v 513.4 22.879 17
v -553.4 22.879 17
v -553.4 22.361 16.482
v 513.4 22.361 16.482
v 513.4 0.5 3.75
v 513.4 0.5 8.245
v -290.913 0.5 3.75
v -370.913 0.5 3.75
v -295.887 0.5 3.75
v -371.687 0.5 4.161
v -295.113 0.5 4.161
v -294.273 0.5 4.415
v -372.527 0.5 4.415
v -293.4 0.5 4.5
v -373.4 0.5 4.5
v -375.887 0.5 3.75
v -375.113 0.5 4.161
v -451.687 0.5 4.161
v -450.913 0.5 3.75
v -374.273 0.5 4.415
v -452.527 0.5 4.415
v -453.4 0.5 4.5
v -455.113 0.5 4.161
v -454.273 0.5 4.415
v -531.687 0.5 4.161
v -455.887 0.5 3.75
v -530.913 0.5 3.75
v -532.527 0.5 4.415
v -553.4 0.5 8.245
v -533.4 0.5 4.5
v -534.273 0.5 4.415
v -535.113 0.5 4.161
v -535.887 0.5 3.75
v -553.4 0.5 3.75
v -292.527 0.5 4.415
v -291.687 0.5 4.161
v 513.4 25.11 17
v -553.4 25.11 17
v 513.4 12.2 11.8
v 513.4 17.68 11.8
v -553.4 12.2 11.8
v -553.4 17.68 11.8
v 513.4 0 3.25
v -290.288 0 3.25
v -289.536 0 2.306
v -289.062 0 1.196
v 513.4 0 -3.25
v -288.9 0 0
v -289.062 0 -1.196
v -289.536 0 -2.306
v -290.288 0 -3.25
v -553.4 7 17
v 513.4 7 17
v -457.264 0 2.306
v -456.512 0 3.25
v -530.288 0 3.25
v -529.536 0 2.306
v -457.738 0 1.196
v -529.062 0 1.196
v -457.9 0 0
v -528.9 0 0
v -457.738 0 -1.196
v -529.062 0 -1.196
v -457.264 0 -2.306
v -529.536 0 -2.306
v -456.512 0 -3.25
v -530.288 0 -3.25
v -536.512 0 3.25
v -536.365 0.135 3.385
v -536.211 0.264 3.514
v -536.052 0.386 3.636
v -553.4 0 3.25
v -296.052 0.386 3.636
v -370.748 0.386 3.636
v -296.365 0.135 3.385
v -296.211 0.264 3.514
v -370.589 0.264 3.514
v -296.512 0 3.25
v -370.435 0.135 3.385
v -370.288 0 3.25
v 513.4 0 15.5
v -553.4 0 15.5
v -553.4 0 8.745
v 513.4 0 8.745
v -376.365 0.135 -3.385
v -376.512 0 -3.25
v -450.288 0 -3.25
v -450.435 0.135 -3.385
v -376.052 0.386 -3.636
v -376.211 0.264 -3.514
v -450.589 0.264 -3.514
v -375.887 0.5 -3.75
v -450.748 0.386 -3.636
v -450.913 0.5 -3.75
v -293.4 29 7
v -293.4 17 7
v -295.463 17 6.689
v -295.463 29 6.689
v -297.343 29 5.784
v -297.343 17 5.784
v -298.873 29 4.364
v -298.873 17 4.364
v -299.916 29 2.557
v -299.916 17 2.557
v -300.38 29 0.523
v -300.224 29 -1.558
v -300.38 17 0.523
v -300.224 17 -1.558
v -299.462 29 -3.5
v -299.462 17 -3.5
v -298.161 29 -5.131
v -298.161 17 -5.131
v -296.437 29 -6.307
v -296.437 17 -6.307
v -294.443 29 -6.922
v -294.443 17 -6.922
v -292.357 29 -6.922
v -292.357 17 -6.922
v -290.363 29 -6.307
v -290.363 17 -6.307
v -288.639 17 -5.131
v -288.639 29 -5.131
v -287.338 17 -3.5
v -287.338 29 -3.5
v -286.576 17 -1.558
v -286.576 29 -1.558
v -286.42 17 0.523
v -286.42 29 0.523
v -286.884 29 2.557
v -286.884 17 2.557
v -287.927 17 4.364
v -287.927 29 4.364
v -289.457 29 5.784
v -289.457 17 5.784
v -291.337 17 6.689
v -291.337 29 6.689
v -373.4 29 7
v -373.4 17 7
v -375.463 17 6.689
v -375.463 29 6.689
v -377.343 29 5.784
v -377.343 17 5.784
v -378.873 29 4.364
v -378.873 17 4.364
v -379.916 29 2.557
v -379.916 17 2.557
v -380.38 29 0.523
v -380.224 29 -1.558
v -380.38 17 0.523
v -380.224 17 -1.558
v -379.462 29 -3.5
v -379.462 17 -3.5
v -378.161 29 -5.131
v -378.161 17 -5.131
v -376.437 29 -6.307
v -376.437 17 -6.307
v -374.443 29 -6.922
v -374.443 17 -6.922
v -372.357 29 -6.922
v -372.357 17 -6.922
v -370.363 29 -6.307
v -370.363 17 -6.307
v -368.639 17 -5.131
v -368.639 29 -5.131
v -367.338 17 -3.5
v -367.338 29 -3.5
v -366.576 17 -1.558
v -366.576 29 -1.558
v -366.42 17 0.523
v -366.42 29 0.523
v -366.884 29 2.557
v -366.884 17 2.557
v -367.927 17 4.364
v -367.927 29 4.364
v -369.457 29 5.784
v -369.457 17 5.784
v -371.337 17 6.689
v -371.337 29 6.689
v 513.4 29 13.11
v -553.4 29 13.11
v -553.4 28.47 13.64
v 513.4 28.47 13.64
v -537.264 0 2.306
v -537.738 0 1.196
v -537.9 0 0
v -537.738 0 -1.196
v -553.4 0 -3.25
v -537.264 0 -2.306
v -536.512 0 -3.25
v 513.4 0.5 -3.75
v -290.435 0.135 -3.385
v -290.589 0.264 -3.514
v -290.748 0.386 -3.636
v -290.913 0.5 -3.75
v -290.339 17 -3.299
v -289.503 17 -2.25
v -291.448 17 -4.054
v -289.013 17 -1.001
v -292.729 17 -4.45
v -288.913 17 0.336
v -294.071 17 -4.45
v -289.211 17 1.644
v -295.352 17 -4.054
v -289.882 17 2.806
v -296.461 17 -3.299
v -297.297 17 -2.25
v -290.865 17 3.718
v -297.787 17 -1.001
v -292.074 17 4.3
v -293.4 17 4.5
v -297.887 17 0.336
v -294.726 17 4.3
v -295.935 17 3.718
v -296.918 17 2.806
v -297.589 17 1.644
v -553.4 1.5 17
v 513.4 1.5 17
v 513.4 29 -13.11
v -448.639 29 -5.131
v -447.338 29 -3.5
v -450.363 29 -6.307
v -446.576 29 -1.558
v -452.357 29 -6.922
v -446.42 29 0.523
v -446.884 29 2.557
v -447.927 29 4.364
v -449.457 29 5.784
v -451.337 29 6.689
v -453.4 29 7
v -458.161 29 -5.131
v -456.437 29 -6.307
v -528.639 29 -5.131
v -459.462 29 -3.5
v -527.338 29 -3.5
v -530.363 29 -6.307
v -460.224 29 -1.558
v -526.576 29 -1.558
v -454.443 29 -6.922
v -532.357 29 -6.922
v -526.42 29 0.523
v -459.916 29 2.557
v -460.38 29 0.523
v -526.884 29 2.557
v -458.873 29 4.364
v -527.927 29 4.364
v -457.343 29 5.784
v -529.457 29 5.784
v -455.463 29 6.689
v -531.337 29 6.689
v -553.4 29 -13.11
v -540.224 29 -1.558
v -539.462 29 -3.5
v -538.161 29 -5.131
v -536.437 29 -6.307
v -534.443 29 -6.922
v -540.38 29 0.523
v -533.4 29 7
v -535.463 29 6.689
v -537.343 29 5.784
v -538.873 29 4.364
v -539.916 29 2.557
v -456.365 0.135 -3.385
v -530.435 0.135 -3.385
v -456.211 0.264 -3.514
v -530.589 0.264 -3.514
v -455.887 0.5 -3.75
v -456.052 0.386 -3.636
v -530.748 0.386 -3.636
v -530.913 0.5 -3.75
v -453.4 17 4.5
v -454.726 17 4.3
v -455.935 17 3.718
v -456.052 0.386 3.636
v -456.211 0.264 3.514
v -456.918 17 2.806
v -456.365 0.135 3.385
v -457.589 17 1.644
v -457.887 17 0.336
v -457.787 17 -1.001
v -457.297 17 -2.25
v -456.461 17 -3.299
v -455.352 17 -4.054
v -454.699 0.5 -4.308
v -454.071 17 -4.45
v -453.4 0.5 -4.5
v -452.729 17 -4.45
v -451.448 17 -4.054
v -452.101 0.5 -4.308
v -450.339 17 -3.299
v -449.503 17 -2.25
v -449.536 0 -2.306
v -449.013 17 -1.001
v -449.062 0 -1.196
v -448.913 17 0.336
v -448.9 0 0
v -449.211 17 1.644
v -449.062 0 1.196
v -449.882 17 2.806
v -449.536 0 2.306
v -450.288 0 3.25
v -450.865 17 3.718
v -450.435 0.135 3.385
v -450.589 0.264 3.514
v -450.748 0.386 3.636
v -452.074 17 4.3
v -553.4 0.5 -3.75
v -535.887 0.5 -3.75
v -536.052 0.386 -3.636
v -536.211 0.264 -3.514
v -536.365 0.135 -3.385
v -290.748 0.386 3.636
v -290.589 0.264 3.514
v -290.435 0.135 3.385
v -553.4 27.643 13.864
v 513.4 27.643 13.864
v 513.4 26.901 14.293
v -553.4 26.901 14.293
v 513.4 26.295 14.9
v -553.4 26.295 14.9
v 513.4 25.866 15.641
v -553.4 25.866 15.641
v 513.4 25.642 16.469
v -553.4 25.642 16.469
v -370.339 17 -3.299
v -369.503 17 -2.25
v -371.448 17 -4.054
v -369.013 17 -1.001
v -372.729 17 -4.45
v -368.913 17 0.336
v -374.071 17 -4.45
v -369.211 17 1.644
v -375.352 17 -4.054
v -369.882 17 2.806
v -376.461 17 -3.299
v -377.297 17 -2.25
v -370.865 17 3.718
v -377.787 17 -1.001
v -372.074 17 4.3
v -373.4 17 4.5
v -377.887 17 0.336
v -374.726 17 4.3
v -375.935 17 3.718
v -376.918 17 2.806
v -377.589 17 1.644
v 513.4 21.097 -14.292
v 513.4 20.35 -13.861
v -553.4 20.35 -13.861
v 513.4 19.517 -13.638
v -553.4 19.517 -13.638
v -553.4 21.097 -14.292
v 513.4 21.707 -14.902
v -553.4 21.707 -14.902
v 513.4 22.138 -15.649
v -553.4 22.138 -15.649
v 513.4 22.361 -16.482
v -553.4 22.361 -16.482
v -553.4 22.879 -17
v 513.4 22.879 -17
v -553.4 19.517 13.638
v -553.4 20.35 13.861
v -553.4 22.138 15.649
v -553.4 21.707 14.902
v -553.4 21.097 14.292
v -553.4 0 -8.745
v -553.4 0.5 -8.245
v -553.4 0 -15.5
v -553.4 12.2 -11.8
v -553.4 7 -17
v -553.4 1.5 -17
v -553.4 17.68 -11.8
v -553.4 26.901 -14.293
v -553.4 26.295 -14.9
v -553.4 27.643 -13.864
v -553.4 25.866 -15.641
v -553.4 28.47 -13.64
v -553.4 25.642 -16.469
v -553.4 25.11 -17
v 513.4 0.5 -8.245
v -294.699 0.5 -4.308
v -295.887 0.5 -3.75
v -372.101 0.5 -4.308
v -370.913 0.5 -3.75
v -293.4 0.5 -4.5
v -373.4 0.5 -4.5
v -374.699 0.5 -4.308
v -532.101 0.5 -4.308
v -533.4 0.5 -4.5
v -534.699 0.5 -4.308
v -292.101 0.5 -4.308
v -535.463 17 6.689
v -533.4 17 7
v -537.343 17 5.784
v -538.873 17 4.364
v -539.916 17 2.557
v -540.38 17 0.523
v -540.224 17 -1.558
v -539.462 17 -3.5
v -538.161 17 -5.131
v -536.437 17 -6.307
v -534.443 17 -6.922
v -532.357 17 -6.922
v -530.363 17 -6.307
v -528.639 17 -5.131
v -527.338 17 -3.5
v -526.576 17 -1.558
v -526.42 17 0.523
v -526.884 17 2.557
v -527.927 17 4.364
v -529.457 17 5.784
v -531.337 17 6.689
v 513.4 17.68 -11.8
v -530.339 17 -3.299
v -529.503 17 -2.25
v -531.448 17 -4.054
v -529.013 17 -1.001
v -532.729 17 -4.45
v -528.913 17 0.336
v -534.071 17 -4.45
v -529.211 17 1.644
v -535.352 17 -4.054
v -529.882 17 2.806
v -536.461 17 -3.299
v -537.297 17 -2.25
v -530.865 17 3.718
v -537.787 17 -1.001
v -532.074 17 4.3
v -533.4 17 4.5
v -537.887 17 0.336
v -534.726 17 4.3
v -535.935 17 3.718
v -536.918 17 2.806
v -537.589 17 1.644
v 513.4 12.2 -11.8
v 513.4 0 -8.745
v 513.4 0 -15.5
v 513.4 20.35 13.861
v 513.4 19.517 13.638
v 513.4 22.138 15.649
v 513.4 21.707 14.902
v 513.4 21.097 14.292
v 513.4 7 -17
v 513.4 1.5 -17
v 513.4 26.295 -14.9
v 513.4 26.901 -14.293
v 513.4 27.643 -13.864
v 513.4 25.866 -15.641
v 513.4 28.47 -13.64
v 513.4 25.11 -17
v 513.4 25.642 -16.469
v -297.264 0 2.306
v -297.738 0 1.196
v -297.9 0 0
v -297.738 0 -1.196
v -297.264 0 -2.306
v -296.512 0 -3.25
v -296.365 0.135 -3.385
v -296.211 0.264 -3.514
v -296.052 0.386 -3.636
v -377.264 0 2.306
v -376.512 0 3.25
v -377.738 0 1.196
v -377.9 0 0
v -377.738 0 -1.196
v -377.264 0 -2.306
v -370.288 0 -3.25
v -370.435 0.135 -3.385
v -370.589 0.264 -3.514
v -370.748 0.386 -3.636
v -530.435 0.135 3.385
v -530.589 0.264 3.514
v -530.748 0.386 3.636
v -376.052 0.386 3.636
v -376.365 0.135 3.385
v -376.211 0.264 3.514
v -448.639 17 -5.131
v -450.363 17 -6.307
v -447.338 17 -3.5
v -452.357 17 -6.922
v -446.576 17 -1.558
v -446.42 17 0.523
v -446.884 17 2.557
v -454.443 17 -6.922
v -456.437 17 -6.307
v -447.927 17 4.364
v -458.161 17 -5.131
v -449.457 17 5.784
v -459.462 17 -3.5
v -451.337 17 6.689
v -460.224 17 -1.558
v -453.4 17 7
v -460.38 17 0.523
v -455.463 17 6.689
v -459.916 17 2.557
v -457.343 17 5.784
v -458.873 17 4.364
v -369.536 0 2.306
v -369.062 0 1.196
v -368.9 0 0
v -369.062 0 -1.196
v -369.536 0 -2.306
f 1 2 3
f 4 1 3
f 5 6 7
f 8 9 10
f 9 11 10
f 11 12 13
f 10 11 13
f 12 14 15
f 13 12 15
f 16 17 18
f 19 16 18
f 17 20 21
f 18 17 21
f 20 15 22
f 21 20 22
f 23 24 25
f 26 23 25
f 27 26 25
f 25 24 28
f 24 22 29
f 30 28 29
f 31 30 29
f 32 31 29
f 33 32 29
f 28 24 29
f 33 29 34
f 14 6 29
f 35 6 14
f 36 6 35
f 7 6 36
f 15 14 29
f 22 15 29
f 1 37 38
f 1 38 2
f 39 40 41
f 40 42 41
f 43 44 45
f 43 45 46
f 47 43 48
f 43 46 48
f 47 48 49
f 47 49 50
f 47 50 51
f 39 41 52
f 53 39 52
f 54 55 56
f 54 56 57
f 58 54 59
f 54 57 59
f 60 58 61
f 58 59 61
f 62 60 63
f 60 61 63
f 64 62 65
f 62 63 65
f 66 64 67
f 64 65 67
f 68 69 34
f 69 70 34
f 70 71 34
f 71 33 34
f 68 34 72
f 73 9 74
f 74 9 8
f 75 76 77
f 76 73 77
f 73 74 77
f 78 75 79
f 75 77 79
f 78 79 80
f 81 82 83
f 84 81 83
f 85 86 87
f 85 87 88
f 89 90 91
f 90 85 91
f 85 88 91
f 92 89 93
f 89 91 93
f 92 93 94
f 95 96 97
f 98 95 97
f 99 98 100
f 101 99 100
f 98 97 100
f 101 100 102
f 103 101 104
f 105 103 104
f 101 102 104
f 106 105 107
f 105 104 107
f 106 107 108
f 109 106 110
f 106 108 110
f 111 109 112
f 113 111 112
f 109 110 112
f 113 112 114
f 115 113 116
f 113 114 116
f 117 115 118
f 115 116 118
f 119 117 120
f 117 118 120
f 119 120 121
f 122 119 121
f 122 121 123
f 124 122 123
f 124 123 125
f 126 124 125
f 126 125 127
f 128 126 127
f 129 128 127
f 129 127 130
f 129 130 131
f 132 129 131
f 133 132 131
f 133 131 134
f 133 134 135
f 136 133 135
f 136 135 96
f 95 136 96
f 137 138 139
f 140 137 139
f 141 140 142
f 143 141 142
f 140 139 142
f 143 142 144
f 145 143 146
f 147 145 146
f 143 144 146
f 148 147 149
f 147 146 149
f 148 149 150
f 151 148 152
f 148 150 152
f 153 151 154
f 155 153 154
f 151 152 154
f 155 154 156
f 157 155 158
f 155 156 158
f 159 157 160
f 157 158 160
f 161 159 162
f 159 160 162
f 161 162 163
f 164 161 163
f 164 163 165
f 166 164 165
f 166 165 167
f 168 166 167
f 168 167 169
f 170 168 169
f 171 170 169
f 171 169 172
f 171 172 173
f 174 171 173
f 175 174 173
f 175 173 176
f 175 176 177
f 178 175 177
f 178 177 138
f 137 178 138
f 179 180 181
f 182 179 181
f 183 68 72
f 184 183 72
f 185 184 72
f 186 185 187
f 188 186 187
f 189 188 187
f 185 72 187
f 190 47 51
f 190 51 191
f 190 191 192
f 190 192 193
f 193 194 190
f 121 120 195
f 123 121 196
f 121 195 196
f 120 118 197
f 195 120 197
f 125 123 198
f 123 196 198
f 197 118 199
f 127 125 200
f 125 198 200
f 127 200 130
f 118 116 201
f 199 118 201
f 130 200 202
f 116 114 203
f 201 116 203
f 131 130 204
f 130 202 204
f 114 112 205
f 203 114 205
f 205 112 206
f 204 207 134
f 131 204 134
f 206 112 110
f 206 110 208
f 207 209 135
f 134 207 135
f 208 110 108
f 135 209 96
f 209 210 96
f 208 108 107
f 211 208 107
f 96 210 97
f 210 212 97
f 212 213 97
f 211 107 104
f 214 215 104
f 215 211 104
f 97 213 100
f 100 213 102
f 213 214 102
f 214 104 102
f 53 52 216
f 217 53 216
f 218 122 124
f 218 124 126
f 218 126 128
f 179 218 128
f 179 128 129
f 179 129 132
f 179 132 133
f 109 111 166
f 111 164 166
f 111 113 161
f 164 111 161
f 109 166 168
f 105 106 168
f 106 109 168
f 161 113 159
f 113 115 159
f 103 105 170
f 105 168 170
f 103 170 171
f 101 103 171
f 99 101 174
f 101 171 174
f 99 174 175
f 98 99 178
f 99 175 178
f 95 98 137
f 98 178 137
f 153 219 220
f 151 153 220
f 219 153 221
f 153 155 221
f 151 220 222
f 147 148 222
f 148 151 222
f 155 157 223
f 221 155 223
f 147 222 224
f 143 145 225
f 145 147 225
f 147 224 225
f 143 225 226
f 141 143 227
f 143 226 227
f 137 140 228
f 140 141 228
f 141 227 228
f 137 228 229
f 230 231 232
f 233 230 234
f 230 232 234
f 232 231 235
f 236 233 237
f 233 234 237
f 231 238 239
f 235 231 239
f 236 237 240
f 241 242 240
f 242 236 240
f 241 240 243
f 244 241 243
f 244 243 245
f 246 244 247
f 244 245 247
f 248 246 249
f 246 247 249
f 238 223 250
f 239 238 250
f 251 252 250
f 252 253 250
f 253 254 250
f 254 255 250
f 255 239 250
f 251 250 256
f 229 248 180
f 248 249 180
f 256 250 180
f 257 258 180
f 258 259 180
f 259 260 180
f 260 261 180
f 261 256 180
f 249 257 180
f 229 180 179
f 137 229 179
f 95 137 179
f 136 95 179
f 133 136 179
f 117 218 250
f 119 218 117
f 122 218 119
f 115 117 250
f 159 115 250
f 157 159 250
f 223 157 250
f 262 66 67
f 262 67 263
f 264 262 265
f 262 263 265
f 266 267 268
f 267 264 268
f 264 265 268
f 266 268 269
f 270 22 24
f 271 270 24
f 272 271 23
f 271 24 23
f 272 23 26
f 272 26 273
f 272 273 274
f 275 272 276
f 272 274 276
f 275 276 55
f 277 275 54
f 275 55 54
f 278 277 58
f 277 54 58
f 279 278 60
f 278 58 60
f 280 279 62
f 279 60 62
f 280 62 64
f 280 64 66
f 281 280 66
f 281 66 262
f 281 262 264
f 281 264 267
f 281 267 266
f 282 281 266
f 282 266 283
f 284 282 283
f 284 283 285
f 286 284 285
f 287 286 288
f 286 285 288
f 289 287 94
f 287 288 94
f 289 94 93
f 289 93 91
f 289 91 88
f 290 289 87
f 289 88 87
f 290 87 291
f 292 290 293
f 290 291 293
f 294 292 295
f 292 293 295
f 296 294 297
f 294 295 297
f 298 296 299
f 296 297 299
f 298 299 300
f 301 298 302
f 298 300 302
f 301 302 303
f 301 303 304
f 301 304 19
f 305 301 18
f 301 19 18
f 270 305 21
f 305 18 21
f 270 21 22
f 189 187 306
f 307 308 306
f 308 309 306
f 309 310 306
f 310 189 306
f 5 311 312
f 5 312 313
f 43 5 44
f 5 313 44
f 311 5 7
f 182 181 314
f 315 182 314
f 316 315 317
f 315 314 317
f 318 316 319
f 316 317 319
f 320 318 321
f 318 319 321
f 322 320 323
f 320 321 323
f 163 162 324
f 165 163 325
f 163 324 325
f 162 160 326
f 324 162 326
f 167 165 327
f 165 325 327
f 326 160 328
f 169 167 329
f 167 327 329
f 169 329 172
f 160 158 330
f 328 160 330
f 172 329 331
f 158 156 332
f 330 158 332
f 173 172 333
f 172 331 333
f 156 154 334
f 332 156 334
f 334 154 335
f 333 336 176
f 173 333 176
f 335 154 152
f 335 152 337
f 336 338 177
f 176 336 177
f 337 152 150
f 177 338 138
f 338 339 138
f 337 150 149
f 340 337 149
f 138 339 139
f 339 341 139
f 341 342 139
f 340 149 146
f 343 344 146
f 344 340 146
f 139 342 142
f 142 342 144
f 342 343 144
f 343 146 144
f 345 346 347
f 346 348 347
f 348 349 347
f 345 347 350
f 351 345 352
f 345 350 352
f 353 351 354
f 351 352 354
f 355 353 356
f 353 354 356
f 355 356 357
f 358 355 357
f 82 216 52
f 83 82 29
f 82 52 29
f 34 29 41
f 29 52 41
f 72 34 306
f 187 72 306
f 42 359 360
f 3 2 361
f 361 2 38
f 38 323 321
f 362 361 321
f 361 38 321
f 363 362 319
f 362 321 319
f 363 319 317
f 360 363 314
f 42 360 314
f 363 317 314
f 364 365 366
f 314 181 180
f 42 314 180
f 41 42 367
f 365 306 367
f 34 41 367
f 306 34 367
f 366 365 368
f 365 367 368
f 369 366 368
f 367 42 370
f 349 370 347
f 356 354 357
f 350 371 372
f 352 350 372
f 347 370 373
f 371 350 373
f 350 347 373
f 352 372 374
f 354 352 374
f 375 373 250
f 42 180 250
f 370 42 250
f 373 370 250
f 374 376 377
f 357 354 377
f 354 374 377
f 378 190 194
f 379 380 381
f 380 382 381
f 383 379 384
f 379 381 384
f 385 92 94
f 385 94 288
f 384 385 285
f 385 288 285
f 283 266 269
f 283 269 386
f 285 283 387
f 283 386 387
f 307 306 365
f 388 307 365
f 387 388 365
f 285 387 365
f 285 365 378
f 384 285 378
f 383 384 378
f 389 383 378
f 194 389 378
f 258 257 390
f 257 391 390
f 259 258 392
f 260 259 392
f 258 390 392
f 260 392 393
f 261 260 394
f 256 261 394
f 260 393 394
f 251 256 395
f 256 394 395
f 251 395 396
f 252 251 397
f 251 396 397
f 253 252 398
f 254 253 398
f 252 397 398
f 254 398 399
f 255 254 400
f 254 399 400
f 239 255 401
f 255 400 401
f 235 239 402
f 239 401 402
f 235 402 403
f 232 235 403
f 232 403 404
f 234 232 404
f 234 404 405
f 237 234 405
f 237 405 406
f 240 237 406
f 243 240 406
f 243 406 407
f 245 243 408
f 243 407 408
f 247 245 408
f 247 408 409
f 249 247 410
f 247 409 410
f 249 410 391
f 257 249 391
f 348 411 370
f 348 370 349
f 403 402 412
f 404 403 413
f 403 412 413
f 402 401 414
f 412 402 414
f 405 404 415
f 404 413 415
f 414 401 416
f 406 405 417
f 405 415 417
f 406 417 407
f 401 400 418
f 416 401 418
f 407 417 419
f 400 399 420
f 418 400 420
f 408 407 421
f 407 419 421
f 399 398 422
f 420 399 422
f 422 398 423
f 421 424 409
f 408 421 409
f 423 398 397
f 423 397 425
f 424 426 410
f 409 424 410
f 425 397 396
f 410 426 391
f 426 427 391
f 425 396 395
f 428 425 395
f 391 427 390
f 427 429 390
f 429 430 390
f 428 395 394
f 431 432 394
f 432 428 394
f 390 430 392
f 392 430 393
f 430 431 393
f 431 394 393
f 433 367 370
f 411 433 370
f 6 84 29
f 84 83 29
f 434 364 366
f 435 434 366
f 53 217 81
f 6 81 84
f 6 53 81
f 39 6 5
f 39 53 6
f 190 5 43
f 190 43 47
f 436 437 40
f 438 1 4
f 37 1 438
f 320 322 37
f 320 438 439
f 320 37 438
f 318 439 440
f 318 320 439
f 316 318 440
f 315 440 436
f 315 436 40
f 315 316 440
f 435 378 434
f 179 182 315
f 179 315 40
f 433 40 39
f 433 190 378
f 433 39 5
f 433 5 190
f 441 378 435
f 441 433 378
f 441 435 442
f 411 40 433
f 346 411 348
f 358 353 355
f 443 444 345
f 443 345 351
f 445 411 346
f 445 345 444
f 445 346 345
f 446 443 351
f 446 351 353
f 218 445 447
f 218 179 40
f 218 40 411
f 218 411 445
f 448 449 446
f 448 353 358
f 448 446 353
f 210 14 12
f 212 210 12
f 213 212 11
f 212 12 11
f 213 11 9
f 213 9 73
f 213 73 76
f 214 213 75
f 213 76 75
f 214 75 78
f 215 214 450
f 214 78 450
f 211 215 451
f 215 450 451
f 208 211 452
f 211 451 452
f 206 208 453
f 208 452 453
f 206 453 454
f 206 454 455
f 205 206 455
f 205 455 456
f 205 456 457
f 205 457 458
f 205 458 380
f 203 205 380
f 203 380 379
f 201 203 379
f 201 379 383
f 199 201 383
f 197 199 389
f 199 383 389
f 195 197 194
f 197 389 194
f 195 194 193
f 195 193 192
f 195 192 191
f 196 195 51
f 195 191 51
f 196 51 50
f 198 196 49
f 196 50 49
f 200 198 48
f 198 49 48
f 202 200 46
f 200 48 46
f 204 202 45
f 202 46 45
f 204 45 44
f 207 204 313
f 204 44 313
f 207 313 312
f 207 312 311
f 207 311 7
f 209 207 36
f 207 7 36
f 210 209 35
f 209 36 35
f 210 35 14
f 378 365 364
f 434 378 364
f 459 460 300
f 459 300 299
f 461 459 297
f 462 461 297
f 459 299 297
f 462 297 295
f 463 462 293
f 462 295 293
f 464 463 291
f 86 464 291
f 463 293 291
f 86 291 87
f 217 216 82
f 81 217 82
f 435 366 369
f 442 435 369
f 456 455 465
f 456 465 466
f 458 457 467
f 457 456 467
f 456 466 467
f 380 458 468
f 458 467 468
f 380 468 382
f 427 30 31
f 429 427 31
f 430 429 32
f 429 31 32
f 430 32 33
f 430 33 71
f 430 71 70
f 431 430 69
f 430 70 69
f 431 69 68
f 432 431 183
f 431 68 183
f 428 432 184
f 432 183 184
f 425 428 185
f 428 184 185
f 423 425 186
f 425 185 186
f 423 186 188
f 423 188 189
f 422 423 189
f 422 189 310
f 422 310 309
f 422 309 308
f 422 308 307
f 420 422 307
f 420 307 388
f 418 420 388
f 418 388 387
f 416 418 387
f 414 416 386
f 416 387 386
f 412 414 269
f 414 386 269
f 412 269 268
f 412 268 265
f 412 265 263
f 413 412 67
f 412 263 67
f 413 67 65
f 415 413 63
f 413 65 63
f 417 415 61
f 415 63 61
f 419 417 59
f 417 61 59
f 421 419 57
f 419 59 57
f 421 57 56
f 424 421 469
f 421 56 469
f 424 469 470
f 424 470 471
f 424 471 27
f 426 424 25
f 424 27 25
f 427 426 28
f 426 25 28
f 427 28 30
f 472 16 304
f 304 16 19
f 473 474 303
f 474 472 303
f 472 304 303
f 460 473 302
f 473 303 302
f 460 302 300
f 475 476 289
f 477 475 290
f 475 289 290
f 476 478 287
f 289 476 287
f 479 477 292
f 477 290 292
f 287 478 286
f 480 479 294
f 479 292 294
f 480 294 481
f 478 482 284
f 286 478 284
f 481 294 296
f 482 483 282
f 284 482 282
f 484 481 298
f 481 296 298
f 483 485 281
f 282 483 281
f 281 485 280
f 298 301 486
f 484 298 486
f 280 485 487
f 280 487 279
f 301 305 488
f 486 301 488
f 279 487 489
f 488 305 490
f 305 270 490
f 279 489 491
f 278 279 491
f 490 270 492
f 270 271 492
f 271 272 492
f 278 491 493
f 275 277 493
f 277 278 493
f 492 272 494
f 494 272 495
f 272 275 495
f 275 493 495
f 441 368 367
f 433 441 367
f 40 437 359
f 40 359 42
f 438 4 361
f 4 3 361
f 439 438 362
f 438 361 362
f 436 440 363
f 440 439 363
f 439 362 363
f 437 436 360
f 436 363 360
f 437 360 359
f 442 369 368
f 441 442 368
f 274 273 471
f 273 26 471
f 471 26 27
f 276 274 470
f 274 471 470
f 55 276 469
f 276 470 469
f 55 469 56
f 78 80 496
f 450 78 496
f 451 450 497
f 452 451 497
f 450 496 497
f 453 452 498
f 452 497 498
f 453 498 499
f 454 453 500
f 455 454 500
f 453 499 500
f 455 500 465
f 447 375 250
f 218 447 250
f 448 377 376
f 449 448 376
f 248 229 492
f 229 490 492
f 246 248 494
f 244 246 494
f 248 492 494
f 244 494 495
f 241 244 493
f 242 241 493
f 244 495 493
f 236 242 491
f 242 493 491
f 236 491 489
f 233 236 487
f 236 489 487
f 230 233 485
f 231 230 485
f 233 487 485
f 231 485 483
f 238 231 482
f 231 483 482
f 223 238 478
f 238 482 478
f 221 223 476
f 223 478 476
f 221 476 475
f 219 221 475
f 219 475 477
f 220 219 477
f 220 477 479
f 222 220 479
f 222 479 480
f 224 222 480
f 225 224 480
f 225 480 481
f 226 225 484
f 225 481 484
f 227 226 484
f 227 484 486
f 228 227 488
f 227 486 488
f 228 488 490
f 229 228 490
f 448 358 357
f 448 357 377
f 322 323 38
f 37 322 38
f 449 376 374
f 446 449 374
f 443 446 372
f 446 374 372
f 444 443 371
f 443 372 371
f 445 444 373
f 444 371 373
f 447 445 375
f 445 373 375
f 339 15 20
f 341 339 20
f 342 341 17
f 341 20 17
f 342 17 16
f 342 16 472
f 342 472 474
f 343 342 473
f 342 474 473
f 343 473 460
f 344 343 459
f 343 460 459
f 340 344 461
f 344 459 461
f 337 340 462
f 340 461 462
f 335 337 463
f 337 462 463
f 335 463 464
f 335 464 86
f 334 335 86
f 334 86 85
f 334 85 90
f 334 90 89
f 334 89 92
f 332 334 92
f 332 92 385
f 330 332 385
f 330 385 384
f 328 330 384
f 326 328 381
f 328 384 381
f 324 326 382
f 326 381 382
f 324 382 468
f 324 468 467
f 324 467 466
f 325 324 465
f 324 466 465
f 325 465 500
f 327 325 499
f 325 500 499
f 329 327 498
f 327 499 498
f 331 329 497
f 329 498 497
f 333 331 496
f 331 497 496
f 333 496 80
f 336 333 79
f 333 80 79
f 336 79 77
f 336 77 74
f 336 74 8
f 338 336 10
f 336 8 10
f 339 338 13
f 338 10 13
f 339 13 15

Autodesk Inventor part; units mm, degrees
sketch "Sketch_18" plane through (-20, 0, 0) normal (1, 0, 0) x (0, 0, -1)
  line L0 (-17, 1.5) -> (-15.5, 0)
  line L1 (-15.5, 0) -> (-8.745, 0)
  line L2 (-8.745, 0) -> (-8.245, 0.5)
  line L3 (-8.245, 0.5) -> (-3.75, 0.5)
  line L4 (-3.75, 0.5) -> (-3.25, 0)
  line L5 (-3.25, 0) -> (3.25, 0)
  line L6 (3.25, 0) -> (3.75, 0.5)
  line L7 (3.75, 0.5) -> (8.245, 0.5)
  line L8 (8.245, 0.5) -> (8.745, 0)
  line L9 (8.745, 0) -> (15.5, 0)
  line L10 (15.5, 0) -> (17, 1.5)
  line L11 (17, 1.5) -> (17, 7.0002)
  line L12 (17, 7.0002) -> (11.8003, 12.1999)
  line L13 (11.8003, 12.1999) -> (11.8003, 17.6796)
  line L14 (11.8003, 17.6796) -> (13.6381, 19.5174)
  arc A0 (16.4816, 22.3609) -> (13.6381, 19.5174) centre (16.9102, 19.0889) ccw
  line L15 (16.4816, 22.3609) -> (17, 22.8793)
  line L16 (17, 22.8793) -> (17, 25.1102)
  line L17 (17, 25.1102) -> (16.4686, 25.6415)
  arc A1 (13.6398, 28.4703) -> (16.4686, 25.6415) centre (16.9102, 28.9119) ccw
  line L18 (13.6398, 28.4703) -> (13.1102, 29)
  line L19 (13.1102, 29) -> (-13.1102, 29)
  line L20 (-13.1102, 29) -> (-13.6398, 28.4703)
  arc A2 (-16.4686, 25.6415) -> (-13.6398, 28.4703) centre (-16.9102, 28.9119) ccw
  line L21 (-16.4686, 25.6415) -> (-17, 25.1102)
  line L22 (-17, 25.1102) -> (-17, 22.8793)
  line L23 (-17, 22.8793) -> (-16.4816, 22.3609)
  arc A3 (-13.6381, 19.5174) -> (-16.4816, 22.3609) centre (-16.9102, 19.0889) ccw
  line L24 (-13.6381, 19.5174) -> (-11.8003, 17.6796)
  line L25 (-11.8003, 17.6796) -> (-11.8003, 12.1999)
  line L26 (-11.8003, 12.1999) -> (-17, 7.0002)
  line L27 (-17, 7.0002) -> (-17, 1.5)
extrude "Extrusion1" add sketch "Sketch_18" along normal mid plane 1066.8
sketch "Sketch2" plane through (-553.4, 29, 13.1102) normal (0, 1, 0) x (1, 0, 0)
  point P0 (20, 13.1102)
hole "Hole1" at (-533.4, 29, 0) direction (0, -1, 0) diameter 9 depth 29 counterbore diameter 14 counterbore depth 12
pattern_linear "Rectangular Pattern1" count 4 spacing 80 along (1, 0, 0) of "Hole1"
ref_plane "4dummy_XY" through (0, 0, 0) normal (1, 0, 0) x (0, 0, -1)
ref_plane "4dummy_YZ" through (0, 0, 0) normal (0, 0, -1) x (0, 1, 0)
ref_plane "4dummy_ZX" through (0, 0, 0) normal (0, 1, 0) x (1, 0, 0)
ref_plane "4slide_XY" through (-20, 7.5, 0) normal (1, 0, 0) x (0, 0, -1)
ref_plane "4slide_YZ" through (-20, 7.5, 0) normal (0, 0, -1) x (0, 1, 0)
ref_plane "4slide_ZX" through (-20, 7.5, 0) normal (0, 1, 0) x (1, 0, 0)
ref_plane "4track_XY" through (0, 0, 0) normal (0, 0, 1) x (1, 0, 0)
ref_plane "4track_YZ" through (0, 0, 0) normal (1, 0, 0) x (0, 1, 0)
ref_plane "4track_ZX" through (0, 0, 0) normal (0, 1, 0) x (0, 0, 1)
properties part number "HSR35R128020 Rail"
